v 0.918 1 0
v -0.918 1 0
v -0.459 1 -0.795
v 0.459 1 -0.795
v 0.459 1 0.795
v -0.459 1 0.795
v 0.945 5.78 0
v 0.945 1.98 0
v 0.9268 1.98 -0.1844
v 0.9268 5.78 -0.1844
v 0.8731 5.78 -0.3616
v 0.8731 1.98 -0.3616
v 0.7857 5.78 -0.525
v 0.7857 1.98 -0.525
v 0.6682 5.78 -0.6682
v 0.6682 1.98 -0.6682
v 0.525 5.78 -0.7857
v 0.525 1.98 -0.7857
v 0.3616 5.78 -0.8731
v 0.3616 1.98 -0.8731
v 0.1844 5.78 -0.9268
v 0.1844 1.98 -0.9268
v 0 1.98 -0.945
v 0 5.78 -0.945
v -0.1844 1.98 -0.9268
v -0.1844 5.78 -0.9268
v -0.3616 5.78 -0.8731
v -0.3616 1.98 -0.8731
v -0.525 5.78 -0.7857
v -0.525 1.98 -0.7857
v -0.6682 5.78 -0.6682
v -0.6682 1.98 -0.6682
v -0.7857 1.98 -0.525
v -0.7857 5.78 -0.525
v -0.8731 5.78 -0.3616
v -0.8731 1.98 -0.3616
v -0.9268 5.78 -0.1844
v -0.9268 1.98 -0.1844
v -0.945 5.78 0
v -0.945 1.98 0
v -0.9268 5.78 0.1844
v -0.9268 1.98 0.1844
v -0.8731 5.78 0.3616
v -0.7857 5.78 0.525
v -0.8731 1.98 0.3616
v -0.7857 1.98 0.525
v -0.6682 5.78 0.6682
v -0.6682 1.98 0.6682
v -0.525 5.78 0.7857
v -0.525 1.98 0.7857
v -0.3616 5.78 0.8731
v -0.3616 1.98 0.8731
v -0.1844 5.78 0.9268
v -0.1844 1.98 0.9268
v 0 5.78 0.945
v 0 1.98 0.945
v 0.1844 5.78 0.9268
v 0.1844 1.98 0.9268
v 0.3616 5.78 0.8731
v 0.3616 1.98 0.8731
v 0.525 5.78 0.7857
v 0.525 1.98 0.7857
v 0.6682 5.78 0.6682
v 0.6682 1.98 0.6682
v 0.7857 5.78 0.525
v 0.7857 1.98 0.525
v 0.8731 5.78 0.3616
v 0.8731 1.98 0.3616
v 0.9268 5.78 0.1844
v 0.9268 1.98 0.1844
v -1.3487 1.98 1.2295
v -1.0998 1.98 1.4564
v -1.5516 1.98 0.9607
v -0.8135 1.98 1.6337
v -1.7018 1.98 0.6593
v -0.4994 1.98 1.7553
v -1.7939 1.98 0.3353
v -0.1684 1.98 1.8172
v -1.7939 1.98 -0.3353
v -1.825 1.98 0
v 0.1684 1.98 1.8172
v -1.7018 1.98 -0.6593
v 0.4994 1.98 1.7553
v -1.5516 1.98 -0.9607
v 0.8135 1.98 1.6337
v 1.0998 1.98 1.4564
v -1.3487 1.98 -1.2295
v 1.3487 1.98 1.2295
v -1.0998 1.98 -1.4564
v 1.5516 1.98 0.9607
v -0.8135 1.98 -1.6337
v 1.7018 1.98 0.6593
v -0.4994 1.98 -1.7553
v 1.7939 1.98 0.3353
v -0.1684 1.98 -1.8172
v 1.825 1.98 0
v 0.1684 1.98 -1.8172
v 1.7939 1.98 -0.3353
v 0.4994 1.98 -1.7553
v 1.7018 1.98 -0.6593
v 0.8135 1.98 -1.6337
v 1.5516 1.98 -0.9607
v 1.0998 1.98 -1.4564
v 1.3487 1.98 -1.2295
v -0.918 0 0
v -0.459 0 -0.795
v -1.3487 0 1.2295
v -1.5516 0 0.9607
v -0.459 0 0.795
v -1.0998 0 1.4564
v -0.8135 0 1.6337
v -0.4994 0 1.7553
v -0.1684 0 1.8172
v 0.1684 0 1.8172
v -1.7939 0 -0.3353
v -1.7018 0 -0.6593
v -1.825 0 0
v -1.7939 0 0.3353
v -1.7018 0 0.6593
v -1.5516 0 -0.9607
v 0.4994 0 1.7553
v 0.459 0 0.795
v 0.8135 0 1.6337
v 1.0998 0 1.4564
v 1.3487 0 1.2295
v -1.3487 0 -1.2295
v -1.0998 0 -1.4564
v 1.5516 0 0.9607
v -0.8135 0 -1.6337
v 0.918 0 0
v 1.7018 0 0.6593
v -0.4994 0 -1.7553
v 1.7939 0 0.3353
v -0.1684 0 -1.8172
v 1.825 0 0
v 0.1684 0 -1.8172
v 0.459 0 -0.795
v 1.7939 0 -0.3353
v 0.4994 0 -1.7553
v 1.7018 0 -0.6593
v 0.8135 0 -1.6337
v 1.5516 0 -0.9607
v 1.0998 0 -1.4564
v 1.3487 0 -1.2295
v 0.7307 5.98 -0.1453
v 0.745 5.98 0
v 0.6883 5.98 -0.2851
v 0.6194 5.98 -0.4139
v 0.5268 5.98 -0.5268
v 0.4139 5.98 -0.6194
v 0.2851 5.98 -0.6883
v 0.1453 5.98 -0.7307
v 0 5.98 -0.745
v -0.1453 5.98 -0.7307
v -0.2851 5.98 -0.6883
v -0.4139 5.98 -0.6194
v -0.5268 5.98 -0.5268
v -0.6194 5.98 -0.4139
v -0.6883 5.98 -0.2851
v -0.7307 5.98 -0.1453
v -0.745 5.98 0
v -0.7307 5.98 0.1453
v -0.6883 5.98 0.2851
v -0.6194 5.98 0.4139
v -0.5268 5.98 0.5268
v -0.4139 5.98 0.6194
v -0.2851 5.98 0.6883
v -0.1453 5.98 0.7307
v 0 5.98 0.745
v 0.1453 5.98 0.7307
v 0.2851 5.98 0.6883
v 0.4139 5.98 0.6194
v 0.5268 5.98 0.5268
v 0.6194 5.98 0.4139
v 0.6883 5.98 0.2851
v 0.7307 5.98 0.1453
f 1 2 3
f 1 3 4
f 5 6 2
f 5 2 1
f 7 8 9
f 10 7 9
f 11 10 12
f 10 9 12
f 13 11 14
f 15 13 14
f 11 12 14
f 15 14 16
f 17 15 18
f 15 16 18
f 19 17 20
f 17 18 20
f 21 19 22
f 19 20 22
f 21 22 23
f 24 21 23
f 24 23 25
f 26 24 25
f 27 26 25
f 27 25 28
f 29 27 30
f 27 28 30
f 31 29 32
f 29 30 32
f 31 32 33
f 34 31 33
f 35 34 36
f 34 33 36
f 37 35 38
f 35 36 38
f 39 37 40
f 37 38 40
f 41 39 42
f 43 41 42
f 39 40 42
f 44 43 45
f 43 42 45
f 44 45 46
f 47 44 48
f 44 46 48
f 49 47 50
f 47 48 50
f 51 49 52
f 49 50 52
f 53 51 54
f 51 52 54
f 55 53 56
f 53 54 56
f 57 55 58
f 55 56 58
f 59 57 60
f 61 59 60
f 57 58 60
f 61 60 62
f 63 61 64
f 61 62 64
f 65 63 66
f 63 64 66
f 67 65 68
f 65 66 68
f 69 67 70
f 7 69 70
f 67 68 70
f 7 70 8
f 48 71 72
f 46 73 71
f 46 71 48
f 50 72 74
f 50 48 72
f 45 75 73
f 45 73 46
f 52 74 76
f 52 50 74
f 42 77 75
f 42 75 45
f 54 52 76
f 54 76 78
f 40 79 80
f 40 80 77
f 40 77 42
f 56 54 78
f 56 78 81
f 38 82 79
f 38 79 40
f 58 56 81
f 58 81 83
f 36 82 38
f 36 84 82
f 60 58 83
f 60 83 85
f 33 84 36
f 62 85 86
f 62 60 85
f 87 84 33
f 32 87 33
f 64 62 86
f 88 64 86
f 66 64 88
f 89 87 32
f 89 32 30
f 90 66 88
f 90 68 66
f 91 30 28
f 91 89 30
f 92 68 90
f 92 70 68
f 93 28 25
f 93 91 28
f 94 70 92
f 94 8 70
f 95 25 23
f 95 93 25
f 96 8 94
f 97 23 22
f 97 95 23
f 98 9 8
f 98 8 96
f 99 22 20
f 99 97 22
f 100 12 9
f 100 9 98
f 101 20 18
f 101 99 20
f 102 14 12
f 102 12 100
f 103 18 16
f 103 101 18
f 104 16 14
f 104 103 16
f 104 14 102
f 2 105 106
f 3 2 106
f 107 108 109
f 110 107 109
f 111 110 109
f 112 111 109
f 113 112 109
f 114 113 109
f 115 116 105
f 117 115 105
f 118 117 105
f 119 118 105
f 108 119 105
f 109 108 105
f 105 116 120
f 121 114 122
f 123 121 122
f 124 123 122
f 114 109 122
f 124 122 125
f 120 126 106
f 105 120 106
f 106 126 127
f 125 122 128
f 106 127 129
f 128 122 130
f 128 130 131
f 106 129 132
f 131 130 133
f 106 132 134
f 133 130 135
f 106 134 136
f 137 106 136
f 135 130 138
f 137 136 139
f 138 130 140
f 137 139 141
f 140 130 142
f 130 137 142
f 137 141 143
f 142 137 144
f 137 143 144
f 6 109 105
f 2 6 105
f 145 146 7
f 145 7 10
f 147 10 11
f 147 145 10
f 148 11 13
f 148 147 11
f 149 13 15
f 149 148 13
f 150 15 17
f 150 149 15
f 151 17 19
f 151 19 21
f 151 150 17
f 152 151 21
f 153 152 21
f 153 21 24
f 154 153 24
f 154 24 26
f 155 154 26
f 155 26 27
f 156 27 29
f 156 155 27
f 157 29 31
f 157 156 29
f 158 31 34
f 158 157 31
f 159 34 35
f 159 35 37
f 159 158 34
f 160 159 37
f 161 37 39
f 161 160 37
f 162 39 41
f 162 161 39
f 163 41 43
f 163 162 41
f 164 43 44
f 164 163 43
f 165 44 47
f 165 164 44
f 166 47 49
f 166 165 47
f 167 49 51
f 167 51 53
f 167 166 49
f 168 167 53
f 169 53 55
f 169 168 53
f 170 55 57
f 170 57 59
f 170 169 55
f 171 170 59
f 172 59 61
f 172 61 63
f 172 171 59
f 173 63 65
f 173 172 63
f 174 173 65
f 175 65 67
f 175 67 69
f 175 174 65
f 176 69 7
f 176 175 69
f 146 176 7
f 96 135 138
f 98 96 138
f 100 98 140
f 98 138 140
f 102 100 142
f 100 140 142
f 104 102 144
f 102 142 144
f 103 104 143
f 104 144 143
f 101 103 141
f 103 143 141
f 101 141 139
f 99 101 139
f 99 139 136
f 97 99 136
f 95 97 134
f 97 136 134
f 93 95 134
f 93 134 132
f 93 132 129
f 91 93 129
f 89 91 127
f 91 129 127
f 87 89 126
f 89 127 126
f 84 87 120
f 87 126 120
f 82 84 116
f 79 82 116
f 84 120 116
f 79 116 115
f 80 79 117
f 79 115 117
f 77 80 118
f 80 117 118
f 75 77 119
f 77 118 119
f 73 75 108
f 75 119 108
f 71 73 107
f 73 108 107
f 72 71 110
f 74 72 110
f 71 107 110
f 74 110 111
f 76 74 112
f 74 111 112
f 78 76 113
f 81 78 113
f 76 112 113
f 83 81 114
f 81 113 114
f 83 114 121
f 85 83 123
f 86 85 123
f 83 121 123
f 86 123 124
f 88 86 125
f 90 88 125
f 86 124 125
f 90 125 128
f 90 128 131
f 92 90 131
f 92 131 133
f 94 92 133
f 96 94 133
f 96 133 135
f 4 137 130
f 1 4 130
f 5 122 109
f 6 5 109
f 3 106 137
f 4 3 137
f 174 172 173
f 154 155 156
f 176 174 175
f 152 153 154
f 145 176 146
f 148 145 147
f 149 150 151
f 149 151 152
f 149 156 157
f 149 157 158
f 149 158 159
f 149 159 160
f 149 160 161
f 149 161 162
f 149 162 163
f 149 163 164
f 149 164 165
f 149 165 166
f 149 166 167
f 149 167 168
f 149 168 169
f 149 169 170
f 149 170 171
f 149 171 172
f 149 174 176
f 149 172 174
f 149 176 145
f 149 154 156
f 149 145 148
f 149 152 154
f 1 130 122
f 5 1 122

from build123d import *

# Parameters (mm, degrees)
SKETCH1_R           = 1.825
BOSS_EXTRUDE1_DEPTH = 1.98
SKETCH2_R           = 0.945
BOSS_EXTRUDE2_DEPTH = 4
CUT_EXTRUDE1_DEPTH  = 1
CHAMFER1_SIZE       = 0.2


with BuildPart() as part:
    # Sketch1 → Boss-Extrude1 (new body)
    with BuildSketch(Plane(origin=(0, 0, 0), x_dir=(1, 0, 0), z_dir=(0, 1, 0))):
        Circle(SKETCH1_R)
    extrude(amount=BOSS_EXTRUDE1_DEPTH)

    # Sketch2 → Boss-Extrude2 (add)
    with BuildSketch(Plane(origin=(0, 1.98, 0), x_dir=(1, 0, 0), z_dir=(0, 1, 0))):
        Circle(SKETCH2_R)
    extrude(amount=BOSS_EXTRUDE2_DEPTH)

    # Sketch3 → Cut-Extrude1 (cut)
    with BuildSketch(Plane.XZ):
        Polygon((0.458993464, -0.795), (0.917986928, 0), (0.458993464, 0.795), (-0.458993464, 0.795), (-0.917986928, 0), (-0.458993464, -0.795), align=None)
    extrude(amount=-CUT_EXTRUDE1_DEPTH, mode=Mode.SUBTRACT)

    # Chamfer1
    chamfer1_edges = [part.edges().sort_by_distance(p)[0] for p in [
        (-0.945, 5.98, 0),
    ]]
    chamfer(chamfer1_edges, length=CHAMFER1_SIZE)


solid = part.part
